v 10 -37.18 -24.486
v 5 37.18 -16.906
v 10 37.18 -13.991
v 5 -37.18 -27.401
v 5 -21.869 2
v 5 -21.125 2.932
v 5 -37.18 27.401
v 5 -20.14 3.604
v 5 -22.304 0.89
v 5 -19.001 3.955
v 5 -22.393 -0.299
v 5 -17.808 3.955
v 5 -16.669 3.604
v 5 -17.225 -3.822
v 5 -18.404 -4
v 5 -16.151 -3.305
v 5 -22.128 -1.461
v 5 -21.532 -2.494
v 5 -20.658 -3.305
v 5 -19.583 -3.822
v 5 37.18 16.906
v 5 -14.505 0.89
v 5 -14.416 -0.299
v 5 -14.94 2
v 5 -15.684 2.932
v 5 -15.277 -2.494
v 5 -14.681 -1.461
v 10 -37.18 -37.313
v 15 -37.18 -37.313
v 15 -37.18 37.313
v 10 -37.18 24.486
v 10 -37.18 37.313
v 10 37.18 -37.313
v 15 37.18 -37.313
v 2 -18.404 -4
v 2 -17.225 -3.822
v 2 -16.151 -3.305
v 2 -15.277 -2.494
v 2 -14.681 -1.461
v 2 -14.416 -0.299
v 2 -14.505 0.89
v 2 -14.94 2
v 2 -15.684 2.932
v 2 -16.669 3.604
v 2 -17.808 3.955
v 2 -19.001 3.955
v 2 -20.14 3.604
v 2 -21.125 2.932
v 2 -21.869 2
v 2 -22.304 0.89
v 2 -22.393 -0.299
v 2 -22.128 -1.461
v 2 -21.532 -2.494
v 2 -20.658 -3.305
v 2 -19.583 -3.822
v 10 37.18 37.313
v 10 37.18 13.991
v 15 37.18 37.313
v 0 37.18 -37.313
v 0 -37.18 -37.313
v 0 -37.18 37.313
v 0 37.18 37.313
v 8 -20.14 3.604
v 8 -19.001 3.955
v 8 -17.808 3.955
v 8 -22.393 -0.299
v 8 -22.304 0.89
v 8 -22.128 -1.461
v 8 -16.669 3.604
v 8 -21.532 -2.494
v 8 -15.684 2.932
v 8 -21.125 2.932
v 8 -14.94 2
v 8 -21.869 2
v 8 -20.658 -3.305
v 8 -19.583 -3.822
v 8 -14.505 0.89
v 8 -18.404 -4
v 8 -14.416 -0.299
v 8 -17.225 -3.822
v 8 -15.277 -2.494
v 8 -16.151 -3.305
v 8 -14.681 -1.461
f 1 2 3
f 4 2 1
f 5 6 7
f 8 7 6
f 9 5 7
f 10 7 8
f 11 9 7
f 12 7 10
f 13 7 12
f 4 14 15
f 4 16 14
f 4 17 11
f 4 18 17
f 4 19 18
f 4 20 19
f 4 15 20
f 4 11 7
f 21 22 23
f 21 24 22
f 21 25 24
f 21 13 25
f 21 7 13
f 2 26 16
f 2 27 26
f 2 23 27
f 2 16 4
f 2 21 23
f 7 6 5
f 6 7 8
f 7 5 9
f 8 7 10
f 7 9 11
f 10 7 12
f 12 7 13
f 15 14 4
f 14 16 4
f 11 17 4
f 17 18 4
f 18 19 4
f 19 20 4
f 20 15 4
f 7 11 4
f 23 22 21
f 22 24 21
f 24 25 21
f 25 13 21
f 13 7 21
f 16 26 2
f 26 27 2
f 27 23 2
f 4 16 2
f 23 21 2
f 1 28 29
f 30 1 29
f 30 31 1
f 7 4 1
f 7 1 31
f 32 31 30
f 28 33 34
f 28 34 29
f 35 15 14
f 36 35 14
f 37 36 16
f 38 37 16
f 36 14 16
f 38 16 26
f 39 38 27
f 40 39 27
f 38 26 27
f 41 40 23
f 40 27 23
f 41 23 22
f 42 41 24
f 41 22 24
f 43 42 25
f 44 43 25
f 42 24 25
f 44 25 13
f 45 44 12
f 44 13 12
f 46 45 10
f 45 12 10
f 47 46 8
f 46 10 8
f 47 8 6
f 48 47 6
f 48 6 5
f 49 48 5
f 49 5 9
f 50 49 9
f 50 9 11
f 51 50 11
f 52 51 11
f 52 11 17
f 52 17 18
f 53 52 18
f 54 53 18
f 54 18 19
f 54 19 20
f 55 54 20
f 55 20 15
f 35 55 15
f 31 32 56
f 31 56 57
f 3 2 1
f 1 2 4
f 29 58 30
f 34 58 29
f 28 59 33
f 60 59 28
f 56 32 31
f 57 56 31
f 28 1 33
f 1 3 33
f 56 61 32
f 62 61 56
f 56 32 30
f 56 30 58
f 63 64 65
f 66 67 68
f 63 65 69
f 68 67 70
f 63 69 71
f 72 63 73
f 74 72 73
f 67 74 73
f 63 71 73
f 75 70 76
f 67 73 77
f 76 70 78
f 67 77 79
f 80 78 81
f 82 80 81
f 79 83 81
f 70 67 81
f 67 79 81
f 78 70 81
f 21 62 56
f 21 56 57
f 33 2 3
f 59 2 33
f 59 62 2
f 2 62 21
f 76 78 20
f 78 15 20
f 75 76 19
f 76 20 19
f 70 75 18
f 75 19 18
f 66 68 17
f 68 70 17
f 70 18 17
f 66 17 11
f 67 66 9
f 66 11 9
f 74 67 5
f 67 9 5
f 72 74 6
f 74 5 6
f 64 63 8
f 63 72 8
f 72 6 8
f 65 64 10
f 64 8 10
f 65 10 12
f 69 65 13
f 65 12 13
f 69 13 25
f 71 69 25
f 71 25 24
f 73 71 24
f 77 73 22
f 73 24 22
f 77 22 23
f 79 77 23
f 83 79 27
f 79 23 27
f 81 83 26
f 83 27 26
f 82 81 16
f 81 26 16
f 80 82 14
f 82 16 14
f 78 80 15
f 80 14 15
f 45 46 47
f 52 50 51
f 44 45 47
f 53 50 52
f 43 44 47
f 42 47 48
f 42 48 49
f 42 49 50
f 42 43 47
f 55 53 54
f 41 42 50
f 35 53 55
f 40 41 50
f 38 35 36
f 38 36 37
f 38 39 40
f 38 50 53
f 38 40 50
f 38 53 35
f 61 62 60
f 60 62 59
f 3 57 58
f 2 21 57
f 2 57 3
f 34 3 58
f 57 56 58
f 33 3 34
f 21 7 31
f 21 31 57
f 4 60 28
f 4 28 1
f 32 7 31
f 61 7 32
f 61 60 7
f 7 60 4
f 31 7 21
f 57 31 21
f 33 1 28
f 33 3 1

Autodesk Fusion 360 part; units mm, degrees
sketch "Sketch2" plane through (0, 0, 0) normal (1, 0, 0) x (0, 0, -1)
  line L0 (-37.3127, 37.1798) -> (37.3127, 37.1798)
  line L1 (37.3127, 37.1798) -> (37.3127, -37.1798)
  line L2 (37.3127, -37.1798) -> (-37.3127, -37.1798)
  line L3 (-37.3127, -37.1798) -> (-37.3127, 37.1798)
  line L4 (0, 62.0565) -> (0, -42.698) construction
  line L5 (-61.9952, 0) -> (63.5549, 0) construction
  line L6 (-24.4856, -37.1798) -> (-13.9907, 37.1798)
  line L7 (13.9907, 37.1798) -> (24.4856, -37.1798)
extrude "Extrude1" add sketch "Sketch2" along normal blind 10 contours L0 L2 L3 L6 | L0 L1 L2 L7 makes body 1 at (0, 12.3933, 25.263) makes body 2 at (0, 12.3933, -25.263)
extrude "Extrude2" add sketch "Sketch2" along normal blind 5 contours L0 L2 L6 L7 bodies 1 2
draft "Draft1" angle -30 neutral plane through (10, 0, 0) pull (1, 0, 0) 1 faces at (8.3333, -12.3933, 20.9873) on bodies 1
draft "Draft2" angle -30 neutral plane through (10, 0, 0) pull (1, 0, 0) 1 faces at (8.3333, 12.3933, -17.489) on bodies 1
sketch "Sketch3" plane through (5, 0, 0) normal (1, 0, 0) x (0, 0, -1)
  line L0 (16.9061, 37.1798) -> (-16.9061, 37.1798)
  line L1 (-16.9061, 37.1798) -> (-27.401, -37.1798)
  line L2 (-27.401, -37.1798) -> (27.401, -37.1798)
  line L3 (27.401, -37.1798) -> (16.9061, 37.1798)
  circle A0 centre (0, -18.4044) radius 4
  line L4 (0, 0) -> (0, -18.4044) construction
  dimension "d9" = 8
extrude "Extrude3" cut sketch "Sketch3" against normal blind 3 contours A0 bodies 1
copy_body "Body->Comp1" bodies 1 removing the originals makes body 3 in component "base"
copy_body "CopyPasteBodies1" bodies 3 makes body 4
sketch "Sketch4" plane through (5, 0, 0) normal (1, 0, 0) x (0, 0, -1)
  circle A0 centre (0, -18.4044) radius 4
  line L0 (16.9061, 37.1798) -> (-16.9061, 37.1798)
  line L1 (-16.9061, 37.1798) -> (-27.401, -37.1798) construction
  line L2 (-27.401, -37.1798) -> (27.401, -37.1798)
  line L3 (27.401, -37.1798) -> (16.9061, 37.1798) construction
  line L4 (-37.3127, 37.1798) -> (37.3127, 37.1798)
  line L5 (37.3127, 37.1798) -> (37.3127, -37.1798)
  line L6 (37.3127, -37.1798) -> (-37.3127, -37.1798)
  line L7 (-37.3127, -37.1798) -> (-37.3127, 37.1798)
  point P0 (-37.3127, 37.1798)
  point P1 (37.3127, -37.1798)
extrude "Extrude4" add sketch "Sketch4" along normal blind 10 separate body makes body 5
combine "Combine1" operation cut target body 5 tool bodies 4
delete_face "DeleteFace1" 1 faces at (11.6667, -18.6038, -3.995) on bodies 5
extrude "Extrude5" cut sketch "Sketch3" along normal blind 3 contours A0 bodies 5
copy_body "Body->Comp2" bodies 5 removing the originals makes body 6 in component "tool_plate"
component "base" placed x (1, 0, 0) y (0, 1, 0) z (0, 0, 1) at (0, 0, 0)
component "tool_plate" placed x (1, 0, 0) y (0, 1, 0) z (0, 0, 1) at (0, 0, 0)
